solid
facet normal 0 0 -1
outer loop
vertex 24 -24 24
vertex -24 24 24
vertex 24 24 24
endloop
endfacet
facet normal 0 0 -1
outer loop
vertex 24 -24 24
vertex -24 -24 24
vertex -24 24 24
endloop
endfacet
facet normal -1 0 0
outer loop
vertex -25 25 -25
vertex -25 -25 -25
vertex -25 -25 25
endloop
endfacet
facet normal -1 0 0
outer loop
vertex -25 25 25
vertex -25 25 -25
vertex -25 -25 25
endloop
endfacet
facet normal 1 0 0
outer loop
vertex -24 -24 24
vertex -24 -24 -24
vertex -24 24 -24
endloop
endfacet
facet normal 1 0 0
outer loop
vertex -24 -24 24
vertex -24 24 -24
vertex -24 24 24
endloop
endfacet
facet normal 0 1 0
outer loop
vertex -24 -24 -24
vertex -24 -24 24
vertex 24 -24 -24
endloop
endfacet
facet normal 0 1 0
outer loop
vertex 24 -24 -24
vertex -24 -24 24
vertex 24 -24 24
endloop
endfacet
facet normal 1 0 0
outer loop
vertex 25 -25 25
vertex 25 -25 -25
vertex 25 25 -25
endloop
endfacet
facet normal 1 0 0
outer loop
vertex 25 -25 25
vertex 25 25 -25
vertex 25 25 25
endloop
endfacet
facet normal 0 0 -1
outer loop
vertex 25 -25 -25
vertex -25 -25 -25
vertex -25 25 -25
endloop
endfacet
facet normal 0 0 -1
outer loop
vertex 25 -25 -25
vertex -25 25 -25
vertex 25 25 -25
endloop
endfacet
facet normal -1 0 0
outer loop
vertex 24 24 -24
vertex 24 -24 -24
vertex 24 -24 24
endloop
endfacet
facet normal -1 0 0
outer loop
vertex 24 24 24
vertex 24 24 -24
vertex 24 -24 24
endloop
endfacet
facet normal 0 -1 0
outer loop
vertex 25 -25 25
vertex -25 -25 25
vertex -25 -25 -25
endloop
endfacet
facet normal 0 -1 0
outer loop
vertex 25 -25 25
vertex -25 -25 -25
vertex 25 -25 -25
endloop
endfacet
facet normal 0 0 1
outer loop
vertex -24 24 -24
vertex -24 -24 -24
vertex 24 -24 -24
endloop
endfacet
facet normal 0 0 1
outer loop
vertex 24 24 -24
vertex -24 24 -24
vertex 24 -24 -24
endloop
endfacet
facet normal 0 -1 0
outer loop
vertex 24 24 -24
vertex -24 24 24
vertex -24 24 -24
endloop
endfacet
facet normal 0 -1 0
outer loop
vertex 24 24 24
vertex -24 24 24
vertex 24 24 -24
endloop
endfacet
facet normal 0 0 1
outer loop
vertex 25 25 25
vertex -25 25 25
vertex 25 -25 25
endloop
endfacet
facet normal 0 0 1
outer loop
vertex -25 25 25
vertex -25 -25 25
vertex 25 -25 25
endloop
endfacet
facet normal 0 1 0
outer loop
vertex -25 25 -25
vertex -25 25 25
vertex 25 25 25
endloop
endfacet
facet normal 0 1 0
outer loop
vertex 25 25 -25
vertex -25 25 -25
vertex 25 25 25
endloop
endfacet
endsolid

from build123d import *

# Parameters (mm, degrees)
F0_W     = 50
F0_H     = 50
F0_W_2   = 48
F0_H_2   = 48
F1_DEPTH = 25
F2_DEPTH = 24


with BuildPart() as f1:
    # F0 (on Front) → F1 (new body, symmetric)
    with BuildSketch(Plane.XZ):
        Rectangle(F0_W, F0_H)
        Rectangle(F0_W_2, F0_H_2, mode=Mode.SUBTRACT)
        Rectangle(F0_W_2, F0_H_2)
    extrude(amount=F1_DEPTH, both=True)


with BuildPart() as f2:
    # F0 (on Front) → F2 (new body, symmetric)
    with BuildSketch(Plane.XZ):
        Rectangle(F0_W_2, F0_H_2)
    extrude(amount=F2_DEPTH, both=True)


with BuildPart() as f1_1:
    add(f1.part)

    # F3: cut F2
    add(f2.part, mode=Mode.SUBTRACT)


solid = f1_1.part
